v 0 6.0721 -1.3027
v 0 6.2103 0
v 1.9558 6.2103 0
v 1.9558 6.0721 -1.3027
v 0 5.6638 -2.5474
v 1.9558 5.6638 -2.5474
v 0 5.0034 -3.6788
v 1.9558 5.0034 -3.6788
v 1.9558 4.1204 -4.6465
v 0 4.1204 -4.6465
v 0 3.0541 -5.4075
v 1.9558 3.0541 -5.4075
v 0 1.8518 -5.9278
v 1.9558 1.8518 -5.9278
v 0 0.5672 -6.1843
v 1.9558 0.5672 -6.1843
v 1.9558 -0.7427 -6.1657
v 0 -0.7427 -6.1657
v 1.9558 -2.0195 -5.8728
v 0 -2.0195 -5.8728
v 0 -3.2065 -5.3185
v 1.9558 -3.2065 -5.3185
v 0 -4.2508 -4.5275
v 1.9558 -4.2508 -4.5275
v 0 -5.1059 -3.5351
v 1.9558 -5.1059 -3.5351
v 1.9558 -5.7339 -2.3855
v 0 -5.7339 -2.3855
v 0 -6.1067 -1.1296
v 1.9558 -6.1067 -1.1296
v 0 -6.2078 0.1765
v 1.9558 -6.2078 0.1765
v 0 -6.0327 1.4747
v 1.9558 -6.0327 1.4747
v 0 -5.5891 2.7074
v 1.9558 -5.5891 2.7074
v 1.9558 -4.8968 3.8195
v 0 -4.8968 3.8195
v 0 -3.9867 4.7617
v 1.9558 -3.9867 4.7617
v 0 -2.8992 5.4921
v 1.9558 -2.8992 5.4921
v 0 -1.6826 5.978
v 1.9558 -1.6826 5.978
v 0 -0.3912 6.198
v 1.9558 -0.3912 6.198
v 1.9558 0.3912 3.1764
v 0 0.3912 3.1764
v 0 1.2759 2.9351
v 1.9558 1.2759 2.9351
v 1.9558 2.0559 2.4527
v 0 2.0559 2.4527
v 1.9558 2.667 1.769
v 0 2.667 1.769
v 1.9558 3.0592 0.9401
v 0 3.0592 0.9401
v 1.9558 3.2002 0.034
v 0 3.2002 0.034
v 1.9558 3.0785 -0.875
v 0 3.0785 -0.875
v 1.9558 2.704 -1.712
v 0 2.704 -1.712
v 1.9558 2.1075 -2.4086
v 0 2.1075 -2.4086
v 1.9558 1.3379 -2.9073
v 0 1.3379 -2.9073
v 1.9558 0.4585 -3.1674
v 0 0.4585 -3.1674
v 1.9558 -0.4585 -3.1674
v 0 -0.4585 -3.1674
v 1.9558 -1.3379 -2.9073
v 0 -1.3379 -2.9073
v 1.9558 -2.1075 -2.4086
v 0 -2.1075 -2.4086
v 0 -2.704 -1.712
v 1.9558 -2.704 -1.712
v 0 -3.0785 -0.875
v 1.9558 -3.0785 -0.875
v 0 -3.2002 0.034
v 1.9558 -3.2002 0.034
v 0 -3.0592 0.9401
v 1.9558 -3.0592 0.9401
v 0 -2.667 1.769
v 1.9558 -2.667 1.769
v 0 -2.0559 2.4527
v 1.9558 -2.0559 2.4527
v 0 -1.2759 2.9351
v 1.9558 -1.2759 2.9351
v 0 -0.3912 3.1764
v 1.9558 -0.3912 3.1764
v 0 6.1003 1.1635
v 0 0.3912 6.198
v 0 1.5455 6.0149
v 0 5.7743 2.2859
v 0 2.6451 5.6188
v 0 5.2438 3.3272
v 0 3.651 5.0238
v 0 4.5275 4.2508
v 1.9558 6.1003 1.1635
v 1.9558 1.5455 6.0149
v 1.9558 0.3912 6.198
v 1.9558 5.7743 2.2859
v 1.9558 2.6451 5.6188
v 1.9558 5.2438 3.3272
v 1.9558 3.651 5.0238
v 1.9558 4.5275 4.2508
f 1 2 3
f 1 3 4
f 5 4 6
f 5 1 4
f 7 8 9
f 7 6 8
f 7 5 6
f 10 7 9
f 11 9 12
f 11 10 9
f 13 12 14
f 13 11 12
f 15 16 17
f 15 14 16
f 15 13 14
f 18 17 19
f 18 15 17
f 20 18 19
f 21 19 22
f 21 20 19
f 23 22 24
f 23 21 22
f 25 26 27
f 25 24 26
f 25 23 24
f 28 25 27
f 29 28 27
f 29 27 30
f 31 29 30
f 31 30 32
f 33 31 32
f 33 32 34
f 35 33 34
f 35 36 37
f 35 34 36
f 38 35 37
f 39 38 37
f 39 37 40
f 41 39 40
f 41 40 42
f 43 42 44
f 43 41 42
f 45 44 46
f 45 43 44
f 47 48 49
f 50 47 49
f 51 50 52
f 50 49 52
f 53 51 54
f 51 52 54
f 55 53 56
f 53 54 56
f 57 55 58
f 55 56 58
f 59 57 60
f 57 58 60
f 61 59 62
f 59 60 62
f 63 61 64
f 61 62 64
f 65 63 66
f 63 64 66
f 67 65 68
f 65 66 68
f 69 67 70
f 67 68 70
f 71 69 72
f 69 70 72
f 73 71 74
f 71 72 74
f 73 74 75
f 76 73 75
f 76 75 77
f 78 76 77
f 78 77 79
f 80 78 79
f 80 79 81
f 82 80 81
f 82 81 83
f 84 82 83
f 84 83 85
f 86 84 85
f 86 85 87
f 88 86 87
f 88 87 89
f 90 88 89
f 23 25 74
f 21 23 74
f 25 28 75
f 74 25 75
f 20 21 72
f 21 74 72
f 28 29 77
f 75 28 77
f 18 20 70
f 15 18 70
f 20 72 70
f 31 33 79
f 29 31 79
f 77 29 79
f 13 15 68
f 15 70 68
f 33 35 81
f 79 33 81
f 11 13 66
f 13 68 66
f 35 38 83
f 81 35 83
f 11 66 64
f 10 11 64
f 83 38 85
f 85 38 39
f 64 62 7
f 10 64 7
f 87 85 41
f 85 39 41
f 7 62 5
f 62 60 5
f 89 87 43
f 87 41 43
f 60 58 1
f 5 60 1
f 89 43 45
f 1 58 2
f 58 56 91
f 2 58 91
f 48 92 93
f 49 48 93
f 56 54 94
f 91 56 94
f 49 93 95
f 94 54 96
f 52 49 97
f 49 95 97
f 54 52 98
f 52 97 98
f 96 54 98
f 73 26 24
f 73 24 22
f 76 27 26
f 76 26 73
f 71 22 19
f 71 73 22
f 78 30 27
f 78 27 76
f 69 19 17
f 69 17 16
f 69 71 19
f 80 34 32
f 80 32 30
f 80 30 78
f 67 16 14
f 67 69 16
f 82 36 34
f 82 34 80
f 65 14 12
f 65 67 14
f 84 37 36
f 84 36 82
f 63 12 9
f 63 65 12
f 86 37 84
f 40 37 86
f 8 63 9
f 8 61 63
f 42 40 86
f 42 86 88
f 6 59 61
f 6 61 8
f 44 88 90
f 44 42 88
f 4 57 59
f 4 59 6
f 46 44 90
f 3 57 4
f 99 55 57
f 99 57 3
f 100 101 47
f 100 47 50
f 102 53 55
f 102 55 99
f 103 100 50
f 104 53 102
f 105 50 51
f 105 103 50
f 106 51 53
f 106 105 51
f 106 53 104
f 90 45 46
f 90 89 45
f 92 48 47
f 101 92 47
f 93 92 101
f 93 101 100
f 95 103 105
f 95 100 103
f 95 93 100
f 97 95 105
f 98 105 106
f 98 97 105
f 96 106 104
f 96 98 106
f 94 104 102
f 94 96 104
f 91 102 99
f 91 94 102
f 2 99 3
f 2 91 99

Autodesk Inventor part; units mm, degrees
ref_plane "YZ Plane" through (0, 0, 0) normal (1, 0, 0) x (0, 1, 0)
ref_plane "XZ Plane" through (0, 0, 0) normal (0, 1, 0) x (-1, 0, 0)
sketch "Sketch1" plane through (0, 0, 0) normal (1, 0, 0) x (0, 1, 0)
  circle A0 centre (0, 0) radius 6.2103
  circle A1 centre (0, 0) radius 3.2004
  dimension "d0" = 6.4008
  dimension "d1" = 12.4206
extrude "Body" add sketch "Sketch1" along normal blind 1.9558
sketch "Sketch2" plane through (0, 0, 0) normal (0, 0, 1) x (1, 0, 0)
  line L0 (0, -3.2004) -> (0, 3.2004) projected
  line L1 (1.9558, 6.2103) -> (1.9558, -6.2103) projected
  line L2 (-1.2, 0) -> (7.2, 0) projected
  line L3 (0, -0.3912) -> (1.9558, -0.3912)
  line L4 (0, 0.3912) -> (1.9558, 0.3912)
  dimension "d4" = 0.3912
  dimension "d5" = 0.3912
  dimension "d6" = 90
extrude "Cut" cut sketch "Sketch2" along normal up to next
ref_plane "Work Plane1" through (0, 0, 0) normal (0, -1, 0) x (1, 0, 0)
equation "\"d0\" = SD1"
equation "\"d1\" = SD2"
equation "\"d2\" = SD"
equation "\"d4\" = 0.2 * SD"
equation "\"d5\" = 0.2 * SD"
equation "\"d6\" = FAWI"
equation "\"d7\" = SD"
equation "\"SD1\" = 6.4008"
equation "\"SD2\" = 12.4206"
equation "\"SD\" = 1.9558"
equation "\"FAWI\" = 90deg"
equation "\"NND\" = 6.35"
properties part number "ASME B18.21.1 - 1/4" material "Steel, Mild"
